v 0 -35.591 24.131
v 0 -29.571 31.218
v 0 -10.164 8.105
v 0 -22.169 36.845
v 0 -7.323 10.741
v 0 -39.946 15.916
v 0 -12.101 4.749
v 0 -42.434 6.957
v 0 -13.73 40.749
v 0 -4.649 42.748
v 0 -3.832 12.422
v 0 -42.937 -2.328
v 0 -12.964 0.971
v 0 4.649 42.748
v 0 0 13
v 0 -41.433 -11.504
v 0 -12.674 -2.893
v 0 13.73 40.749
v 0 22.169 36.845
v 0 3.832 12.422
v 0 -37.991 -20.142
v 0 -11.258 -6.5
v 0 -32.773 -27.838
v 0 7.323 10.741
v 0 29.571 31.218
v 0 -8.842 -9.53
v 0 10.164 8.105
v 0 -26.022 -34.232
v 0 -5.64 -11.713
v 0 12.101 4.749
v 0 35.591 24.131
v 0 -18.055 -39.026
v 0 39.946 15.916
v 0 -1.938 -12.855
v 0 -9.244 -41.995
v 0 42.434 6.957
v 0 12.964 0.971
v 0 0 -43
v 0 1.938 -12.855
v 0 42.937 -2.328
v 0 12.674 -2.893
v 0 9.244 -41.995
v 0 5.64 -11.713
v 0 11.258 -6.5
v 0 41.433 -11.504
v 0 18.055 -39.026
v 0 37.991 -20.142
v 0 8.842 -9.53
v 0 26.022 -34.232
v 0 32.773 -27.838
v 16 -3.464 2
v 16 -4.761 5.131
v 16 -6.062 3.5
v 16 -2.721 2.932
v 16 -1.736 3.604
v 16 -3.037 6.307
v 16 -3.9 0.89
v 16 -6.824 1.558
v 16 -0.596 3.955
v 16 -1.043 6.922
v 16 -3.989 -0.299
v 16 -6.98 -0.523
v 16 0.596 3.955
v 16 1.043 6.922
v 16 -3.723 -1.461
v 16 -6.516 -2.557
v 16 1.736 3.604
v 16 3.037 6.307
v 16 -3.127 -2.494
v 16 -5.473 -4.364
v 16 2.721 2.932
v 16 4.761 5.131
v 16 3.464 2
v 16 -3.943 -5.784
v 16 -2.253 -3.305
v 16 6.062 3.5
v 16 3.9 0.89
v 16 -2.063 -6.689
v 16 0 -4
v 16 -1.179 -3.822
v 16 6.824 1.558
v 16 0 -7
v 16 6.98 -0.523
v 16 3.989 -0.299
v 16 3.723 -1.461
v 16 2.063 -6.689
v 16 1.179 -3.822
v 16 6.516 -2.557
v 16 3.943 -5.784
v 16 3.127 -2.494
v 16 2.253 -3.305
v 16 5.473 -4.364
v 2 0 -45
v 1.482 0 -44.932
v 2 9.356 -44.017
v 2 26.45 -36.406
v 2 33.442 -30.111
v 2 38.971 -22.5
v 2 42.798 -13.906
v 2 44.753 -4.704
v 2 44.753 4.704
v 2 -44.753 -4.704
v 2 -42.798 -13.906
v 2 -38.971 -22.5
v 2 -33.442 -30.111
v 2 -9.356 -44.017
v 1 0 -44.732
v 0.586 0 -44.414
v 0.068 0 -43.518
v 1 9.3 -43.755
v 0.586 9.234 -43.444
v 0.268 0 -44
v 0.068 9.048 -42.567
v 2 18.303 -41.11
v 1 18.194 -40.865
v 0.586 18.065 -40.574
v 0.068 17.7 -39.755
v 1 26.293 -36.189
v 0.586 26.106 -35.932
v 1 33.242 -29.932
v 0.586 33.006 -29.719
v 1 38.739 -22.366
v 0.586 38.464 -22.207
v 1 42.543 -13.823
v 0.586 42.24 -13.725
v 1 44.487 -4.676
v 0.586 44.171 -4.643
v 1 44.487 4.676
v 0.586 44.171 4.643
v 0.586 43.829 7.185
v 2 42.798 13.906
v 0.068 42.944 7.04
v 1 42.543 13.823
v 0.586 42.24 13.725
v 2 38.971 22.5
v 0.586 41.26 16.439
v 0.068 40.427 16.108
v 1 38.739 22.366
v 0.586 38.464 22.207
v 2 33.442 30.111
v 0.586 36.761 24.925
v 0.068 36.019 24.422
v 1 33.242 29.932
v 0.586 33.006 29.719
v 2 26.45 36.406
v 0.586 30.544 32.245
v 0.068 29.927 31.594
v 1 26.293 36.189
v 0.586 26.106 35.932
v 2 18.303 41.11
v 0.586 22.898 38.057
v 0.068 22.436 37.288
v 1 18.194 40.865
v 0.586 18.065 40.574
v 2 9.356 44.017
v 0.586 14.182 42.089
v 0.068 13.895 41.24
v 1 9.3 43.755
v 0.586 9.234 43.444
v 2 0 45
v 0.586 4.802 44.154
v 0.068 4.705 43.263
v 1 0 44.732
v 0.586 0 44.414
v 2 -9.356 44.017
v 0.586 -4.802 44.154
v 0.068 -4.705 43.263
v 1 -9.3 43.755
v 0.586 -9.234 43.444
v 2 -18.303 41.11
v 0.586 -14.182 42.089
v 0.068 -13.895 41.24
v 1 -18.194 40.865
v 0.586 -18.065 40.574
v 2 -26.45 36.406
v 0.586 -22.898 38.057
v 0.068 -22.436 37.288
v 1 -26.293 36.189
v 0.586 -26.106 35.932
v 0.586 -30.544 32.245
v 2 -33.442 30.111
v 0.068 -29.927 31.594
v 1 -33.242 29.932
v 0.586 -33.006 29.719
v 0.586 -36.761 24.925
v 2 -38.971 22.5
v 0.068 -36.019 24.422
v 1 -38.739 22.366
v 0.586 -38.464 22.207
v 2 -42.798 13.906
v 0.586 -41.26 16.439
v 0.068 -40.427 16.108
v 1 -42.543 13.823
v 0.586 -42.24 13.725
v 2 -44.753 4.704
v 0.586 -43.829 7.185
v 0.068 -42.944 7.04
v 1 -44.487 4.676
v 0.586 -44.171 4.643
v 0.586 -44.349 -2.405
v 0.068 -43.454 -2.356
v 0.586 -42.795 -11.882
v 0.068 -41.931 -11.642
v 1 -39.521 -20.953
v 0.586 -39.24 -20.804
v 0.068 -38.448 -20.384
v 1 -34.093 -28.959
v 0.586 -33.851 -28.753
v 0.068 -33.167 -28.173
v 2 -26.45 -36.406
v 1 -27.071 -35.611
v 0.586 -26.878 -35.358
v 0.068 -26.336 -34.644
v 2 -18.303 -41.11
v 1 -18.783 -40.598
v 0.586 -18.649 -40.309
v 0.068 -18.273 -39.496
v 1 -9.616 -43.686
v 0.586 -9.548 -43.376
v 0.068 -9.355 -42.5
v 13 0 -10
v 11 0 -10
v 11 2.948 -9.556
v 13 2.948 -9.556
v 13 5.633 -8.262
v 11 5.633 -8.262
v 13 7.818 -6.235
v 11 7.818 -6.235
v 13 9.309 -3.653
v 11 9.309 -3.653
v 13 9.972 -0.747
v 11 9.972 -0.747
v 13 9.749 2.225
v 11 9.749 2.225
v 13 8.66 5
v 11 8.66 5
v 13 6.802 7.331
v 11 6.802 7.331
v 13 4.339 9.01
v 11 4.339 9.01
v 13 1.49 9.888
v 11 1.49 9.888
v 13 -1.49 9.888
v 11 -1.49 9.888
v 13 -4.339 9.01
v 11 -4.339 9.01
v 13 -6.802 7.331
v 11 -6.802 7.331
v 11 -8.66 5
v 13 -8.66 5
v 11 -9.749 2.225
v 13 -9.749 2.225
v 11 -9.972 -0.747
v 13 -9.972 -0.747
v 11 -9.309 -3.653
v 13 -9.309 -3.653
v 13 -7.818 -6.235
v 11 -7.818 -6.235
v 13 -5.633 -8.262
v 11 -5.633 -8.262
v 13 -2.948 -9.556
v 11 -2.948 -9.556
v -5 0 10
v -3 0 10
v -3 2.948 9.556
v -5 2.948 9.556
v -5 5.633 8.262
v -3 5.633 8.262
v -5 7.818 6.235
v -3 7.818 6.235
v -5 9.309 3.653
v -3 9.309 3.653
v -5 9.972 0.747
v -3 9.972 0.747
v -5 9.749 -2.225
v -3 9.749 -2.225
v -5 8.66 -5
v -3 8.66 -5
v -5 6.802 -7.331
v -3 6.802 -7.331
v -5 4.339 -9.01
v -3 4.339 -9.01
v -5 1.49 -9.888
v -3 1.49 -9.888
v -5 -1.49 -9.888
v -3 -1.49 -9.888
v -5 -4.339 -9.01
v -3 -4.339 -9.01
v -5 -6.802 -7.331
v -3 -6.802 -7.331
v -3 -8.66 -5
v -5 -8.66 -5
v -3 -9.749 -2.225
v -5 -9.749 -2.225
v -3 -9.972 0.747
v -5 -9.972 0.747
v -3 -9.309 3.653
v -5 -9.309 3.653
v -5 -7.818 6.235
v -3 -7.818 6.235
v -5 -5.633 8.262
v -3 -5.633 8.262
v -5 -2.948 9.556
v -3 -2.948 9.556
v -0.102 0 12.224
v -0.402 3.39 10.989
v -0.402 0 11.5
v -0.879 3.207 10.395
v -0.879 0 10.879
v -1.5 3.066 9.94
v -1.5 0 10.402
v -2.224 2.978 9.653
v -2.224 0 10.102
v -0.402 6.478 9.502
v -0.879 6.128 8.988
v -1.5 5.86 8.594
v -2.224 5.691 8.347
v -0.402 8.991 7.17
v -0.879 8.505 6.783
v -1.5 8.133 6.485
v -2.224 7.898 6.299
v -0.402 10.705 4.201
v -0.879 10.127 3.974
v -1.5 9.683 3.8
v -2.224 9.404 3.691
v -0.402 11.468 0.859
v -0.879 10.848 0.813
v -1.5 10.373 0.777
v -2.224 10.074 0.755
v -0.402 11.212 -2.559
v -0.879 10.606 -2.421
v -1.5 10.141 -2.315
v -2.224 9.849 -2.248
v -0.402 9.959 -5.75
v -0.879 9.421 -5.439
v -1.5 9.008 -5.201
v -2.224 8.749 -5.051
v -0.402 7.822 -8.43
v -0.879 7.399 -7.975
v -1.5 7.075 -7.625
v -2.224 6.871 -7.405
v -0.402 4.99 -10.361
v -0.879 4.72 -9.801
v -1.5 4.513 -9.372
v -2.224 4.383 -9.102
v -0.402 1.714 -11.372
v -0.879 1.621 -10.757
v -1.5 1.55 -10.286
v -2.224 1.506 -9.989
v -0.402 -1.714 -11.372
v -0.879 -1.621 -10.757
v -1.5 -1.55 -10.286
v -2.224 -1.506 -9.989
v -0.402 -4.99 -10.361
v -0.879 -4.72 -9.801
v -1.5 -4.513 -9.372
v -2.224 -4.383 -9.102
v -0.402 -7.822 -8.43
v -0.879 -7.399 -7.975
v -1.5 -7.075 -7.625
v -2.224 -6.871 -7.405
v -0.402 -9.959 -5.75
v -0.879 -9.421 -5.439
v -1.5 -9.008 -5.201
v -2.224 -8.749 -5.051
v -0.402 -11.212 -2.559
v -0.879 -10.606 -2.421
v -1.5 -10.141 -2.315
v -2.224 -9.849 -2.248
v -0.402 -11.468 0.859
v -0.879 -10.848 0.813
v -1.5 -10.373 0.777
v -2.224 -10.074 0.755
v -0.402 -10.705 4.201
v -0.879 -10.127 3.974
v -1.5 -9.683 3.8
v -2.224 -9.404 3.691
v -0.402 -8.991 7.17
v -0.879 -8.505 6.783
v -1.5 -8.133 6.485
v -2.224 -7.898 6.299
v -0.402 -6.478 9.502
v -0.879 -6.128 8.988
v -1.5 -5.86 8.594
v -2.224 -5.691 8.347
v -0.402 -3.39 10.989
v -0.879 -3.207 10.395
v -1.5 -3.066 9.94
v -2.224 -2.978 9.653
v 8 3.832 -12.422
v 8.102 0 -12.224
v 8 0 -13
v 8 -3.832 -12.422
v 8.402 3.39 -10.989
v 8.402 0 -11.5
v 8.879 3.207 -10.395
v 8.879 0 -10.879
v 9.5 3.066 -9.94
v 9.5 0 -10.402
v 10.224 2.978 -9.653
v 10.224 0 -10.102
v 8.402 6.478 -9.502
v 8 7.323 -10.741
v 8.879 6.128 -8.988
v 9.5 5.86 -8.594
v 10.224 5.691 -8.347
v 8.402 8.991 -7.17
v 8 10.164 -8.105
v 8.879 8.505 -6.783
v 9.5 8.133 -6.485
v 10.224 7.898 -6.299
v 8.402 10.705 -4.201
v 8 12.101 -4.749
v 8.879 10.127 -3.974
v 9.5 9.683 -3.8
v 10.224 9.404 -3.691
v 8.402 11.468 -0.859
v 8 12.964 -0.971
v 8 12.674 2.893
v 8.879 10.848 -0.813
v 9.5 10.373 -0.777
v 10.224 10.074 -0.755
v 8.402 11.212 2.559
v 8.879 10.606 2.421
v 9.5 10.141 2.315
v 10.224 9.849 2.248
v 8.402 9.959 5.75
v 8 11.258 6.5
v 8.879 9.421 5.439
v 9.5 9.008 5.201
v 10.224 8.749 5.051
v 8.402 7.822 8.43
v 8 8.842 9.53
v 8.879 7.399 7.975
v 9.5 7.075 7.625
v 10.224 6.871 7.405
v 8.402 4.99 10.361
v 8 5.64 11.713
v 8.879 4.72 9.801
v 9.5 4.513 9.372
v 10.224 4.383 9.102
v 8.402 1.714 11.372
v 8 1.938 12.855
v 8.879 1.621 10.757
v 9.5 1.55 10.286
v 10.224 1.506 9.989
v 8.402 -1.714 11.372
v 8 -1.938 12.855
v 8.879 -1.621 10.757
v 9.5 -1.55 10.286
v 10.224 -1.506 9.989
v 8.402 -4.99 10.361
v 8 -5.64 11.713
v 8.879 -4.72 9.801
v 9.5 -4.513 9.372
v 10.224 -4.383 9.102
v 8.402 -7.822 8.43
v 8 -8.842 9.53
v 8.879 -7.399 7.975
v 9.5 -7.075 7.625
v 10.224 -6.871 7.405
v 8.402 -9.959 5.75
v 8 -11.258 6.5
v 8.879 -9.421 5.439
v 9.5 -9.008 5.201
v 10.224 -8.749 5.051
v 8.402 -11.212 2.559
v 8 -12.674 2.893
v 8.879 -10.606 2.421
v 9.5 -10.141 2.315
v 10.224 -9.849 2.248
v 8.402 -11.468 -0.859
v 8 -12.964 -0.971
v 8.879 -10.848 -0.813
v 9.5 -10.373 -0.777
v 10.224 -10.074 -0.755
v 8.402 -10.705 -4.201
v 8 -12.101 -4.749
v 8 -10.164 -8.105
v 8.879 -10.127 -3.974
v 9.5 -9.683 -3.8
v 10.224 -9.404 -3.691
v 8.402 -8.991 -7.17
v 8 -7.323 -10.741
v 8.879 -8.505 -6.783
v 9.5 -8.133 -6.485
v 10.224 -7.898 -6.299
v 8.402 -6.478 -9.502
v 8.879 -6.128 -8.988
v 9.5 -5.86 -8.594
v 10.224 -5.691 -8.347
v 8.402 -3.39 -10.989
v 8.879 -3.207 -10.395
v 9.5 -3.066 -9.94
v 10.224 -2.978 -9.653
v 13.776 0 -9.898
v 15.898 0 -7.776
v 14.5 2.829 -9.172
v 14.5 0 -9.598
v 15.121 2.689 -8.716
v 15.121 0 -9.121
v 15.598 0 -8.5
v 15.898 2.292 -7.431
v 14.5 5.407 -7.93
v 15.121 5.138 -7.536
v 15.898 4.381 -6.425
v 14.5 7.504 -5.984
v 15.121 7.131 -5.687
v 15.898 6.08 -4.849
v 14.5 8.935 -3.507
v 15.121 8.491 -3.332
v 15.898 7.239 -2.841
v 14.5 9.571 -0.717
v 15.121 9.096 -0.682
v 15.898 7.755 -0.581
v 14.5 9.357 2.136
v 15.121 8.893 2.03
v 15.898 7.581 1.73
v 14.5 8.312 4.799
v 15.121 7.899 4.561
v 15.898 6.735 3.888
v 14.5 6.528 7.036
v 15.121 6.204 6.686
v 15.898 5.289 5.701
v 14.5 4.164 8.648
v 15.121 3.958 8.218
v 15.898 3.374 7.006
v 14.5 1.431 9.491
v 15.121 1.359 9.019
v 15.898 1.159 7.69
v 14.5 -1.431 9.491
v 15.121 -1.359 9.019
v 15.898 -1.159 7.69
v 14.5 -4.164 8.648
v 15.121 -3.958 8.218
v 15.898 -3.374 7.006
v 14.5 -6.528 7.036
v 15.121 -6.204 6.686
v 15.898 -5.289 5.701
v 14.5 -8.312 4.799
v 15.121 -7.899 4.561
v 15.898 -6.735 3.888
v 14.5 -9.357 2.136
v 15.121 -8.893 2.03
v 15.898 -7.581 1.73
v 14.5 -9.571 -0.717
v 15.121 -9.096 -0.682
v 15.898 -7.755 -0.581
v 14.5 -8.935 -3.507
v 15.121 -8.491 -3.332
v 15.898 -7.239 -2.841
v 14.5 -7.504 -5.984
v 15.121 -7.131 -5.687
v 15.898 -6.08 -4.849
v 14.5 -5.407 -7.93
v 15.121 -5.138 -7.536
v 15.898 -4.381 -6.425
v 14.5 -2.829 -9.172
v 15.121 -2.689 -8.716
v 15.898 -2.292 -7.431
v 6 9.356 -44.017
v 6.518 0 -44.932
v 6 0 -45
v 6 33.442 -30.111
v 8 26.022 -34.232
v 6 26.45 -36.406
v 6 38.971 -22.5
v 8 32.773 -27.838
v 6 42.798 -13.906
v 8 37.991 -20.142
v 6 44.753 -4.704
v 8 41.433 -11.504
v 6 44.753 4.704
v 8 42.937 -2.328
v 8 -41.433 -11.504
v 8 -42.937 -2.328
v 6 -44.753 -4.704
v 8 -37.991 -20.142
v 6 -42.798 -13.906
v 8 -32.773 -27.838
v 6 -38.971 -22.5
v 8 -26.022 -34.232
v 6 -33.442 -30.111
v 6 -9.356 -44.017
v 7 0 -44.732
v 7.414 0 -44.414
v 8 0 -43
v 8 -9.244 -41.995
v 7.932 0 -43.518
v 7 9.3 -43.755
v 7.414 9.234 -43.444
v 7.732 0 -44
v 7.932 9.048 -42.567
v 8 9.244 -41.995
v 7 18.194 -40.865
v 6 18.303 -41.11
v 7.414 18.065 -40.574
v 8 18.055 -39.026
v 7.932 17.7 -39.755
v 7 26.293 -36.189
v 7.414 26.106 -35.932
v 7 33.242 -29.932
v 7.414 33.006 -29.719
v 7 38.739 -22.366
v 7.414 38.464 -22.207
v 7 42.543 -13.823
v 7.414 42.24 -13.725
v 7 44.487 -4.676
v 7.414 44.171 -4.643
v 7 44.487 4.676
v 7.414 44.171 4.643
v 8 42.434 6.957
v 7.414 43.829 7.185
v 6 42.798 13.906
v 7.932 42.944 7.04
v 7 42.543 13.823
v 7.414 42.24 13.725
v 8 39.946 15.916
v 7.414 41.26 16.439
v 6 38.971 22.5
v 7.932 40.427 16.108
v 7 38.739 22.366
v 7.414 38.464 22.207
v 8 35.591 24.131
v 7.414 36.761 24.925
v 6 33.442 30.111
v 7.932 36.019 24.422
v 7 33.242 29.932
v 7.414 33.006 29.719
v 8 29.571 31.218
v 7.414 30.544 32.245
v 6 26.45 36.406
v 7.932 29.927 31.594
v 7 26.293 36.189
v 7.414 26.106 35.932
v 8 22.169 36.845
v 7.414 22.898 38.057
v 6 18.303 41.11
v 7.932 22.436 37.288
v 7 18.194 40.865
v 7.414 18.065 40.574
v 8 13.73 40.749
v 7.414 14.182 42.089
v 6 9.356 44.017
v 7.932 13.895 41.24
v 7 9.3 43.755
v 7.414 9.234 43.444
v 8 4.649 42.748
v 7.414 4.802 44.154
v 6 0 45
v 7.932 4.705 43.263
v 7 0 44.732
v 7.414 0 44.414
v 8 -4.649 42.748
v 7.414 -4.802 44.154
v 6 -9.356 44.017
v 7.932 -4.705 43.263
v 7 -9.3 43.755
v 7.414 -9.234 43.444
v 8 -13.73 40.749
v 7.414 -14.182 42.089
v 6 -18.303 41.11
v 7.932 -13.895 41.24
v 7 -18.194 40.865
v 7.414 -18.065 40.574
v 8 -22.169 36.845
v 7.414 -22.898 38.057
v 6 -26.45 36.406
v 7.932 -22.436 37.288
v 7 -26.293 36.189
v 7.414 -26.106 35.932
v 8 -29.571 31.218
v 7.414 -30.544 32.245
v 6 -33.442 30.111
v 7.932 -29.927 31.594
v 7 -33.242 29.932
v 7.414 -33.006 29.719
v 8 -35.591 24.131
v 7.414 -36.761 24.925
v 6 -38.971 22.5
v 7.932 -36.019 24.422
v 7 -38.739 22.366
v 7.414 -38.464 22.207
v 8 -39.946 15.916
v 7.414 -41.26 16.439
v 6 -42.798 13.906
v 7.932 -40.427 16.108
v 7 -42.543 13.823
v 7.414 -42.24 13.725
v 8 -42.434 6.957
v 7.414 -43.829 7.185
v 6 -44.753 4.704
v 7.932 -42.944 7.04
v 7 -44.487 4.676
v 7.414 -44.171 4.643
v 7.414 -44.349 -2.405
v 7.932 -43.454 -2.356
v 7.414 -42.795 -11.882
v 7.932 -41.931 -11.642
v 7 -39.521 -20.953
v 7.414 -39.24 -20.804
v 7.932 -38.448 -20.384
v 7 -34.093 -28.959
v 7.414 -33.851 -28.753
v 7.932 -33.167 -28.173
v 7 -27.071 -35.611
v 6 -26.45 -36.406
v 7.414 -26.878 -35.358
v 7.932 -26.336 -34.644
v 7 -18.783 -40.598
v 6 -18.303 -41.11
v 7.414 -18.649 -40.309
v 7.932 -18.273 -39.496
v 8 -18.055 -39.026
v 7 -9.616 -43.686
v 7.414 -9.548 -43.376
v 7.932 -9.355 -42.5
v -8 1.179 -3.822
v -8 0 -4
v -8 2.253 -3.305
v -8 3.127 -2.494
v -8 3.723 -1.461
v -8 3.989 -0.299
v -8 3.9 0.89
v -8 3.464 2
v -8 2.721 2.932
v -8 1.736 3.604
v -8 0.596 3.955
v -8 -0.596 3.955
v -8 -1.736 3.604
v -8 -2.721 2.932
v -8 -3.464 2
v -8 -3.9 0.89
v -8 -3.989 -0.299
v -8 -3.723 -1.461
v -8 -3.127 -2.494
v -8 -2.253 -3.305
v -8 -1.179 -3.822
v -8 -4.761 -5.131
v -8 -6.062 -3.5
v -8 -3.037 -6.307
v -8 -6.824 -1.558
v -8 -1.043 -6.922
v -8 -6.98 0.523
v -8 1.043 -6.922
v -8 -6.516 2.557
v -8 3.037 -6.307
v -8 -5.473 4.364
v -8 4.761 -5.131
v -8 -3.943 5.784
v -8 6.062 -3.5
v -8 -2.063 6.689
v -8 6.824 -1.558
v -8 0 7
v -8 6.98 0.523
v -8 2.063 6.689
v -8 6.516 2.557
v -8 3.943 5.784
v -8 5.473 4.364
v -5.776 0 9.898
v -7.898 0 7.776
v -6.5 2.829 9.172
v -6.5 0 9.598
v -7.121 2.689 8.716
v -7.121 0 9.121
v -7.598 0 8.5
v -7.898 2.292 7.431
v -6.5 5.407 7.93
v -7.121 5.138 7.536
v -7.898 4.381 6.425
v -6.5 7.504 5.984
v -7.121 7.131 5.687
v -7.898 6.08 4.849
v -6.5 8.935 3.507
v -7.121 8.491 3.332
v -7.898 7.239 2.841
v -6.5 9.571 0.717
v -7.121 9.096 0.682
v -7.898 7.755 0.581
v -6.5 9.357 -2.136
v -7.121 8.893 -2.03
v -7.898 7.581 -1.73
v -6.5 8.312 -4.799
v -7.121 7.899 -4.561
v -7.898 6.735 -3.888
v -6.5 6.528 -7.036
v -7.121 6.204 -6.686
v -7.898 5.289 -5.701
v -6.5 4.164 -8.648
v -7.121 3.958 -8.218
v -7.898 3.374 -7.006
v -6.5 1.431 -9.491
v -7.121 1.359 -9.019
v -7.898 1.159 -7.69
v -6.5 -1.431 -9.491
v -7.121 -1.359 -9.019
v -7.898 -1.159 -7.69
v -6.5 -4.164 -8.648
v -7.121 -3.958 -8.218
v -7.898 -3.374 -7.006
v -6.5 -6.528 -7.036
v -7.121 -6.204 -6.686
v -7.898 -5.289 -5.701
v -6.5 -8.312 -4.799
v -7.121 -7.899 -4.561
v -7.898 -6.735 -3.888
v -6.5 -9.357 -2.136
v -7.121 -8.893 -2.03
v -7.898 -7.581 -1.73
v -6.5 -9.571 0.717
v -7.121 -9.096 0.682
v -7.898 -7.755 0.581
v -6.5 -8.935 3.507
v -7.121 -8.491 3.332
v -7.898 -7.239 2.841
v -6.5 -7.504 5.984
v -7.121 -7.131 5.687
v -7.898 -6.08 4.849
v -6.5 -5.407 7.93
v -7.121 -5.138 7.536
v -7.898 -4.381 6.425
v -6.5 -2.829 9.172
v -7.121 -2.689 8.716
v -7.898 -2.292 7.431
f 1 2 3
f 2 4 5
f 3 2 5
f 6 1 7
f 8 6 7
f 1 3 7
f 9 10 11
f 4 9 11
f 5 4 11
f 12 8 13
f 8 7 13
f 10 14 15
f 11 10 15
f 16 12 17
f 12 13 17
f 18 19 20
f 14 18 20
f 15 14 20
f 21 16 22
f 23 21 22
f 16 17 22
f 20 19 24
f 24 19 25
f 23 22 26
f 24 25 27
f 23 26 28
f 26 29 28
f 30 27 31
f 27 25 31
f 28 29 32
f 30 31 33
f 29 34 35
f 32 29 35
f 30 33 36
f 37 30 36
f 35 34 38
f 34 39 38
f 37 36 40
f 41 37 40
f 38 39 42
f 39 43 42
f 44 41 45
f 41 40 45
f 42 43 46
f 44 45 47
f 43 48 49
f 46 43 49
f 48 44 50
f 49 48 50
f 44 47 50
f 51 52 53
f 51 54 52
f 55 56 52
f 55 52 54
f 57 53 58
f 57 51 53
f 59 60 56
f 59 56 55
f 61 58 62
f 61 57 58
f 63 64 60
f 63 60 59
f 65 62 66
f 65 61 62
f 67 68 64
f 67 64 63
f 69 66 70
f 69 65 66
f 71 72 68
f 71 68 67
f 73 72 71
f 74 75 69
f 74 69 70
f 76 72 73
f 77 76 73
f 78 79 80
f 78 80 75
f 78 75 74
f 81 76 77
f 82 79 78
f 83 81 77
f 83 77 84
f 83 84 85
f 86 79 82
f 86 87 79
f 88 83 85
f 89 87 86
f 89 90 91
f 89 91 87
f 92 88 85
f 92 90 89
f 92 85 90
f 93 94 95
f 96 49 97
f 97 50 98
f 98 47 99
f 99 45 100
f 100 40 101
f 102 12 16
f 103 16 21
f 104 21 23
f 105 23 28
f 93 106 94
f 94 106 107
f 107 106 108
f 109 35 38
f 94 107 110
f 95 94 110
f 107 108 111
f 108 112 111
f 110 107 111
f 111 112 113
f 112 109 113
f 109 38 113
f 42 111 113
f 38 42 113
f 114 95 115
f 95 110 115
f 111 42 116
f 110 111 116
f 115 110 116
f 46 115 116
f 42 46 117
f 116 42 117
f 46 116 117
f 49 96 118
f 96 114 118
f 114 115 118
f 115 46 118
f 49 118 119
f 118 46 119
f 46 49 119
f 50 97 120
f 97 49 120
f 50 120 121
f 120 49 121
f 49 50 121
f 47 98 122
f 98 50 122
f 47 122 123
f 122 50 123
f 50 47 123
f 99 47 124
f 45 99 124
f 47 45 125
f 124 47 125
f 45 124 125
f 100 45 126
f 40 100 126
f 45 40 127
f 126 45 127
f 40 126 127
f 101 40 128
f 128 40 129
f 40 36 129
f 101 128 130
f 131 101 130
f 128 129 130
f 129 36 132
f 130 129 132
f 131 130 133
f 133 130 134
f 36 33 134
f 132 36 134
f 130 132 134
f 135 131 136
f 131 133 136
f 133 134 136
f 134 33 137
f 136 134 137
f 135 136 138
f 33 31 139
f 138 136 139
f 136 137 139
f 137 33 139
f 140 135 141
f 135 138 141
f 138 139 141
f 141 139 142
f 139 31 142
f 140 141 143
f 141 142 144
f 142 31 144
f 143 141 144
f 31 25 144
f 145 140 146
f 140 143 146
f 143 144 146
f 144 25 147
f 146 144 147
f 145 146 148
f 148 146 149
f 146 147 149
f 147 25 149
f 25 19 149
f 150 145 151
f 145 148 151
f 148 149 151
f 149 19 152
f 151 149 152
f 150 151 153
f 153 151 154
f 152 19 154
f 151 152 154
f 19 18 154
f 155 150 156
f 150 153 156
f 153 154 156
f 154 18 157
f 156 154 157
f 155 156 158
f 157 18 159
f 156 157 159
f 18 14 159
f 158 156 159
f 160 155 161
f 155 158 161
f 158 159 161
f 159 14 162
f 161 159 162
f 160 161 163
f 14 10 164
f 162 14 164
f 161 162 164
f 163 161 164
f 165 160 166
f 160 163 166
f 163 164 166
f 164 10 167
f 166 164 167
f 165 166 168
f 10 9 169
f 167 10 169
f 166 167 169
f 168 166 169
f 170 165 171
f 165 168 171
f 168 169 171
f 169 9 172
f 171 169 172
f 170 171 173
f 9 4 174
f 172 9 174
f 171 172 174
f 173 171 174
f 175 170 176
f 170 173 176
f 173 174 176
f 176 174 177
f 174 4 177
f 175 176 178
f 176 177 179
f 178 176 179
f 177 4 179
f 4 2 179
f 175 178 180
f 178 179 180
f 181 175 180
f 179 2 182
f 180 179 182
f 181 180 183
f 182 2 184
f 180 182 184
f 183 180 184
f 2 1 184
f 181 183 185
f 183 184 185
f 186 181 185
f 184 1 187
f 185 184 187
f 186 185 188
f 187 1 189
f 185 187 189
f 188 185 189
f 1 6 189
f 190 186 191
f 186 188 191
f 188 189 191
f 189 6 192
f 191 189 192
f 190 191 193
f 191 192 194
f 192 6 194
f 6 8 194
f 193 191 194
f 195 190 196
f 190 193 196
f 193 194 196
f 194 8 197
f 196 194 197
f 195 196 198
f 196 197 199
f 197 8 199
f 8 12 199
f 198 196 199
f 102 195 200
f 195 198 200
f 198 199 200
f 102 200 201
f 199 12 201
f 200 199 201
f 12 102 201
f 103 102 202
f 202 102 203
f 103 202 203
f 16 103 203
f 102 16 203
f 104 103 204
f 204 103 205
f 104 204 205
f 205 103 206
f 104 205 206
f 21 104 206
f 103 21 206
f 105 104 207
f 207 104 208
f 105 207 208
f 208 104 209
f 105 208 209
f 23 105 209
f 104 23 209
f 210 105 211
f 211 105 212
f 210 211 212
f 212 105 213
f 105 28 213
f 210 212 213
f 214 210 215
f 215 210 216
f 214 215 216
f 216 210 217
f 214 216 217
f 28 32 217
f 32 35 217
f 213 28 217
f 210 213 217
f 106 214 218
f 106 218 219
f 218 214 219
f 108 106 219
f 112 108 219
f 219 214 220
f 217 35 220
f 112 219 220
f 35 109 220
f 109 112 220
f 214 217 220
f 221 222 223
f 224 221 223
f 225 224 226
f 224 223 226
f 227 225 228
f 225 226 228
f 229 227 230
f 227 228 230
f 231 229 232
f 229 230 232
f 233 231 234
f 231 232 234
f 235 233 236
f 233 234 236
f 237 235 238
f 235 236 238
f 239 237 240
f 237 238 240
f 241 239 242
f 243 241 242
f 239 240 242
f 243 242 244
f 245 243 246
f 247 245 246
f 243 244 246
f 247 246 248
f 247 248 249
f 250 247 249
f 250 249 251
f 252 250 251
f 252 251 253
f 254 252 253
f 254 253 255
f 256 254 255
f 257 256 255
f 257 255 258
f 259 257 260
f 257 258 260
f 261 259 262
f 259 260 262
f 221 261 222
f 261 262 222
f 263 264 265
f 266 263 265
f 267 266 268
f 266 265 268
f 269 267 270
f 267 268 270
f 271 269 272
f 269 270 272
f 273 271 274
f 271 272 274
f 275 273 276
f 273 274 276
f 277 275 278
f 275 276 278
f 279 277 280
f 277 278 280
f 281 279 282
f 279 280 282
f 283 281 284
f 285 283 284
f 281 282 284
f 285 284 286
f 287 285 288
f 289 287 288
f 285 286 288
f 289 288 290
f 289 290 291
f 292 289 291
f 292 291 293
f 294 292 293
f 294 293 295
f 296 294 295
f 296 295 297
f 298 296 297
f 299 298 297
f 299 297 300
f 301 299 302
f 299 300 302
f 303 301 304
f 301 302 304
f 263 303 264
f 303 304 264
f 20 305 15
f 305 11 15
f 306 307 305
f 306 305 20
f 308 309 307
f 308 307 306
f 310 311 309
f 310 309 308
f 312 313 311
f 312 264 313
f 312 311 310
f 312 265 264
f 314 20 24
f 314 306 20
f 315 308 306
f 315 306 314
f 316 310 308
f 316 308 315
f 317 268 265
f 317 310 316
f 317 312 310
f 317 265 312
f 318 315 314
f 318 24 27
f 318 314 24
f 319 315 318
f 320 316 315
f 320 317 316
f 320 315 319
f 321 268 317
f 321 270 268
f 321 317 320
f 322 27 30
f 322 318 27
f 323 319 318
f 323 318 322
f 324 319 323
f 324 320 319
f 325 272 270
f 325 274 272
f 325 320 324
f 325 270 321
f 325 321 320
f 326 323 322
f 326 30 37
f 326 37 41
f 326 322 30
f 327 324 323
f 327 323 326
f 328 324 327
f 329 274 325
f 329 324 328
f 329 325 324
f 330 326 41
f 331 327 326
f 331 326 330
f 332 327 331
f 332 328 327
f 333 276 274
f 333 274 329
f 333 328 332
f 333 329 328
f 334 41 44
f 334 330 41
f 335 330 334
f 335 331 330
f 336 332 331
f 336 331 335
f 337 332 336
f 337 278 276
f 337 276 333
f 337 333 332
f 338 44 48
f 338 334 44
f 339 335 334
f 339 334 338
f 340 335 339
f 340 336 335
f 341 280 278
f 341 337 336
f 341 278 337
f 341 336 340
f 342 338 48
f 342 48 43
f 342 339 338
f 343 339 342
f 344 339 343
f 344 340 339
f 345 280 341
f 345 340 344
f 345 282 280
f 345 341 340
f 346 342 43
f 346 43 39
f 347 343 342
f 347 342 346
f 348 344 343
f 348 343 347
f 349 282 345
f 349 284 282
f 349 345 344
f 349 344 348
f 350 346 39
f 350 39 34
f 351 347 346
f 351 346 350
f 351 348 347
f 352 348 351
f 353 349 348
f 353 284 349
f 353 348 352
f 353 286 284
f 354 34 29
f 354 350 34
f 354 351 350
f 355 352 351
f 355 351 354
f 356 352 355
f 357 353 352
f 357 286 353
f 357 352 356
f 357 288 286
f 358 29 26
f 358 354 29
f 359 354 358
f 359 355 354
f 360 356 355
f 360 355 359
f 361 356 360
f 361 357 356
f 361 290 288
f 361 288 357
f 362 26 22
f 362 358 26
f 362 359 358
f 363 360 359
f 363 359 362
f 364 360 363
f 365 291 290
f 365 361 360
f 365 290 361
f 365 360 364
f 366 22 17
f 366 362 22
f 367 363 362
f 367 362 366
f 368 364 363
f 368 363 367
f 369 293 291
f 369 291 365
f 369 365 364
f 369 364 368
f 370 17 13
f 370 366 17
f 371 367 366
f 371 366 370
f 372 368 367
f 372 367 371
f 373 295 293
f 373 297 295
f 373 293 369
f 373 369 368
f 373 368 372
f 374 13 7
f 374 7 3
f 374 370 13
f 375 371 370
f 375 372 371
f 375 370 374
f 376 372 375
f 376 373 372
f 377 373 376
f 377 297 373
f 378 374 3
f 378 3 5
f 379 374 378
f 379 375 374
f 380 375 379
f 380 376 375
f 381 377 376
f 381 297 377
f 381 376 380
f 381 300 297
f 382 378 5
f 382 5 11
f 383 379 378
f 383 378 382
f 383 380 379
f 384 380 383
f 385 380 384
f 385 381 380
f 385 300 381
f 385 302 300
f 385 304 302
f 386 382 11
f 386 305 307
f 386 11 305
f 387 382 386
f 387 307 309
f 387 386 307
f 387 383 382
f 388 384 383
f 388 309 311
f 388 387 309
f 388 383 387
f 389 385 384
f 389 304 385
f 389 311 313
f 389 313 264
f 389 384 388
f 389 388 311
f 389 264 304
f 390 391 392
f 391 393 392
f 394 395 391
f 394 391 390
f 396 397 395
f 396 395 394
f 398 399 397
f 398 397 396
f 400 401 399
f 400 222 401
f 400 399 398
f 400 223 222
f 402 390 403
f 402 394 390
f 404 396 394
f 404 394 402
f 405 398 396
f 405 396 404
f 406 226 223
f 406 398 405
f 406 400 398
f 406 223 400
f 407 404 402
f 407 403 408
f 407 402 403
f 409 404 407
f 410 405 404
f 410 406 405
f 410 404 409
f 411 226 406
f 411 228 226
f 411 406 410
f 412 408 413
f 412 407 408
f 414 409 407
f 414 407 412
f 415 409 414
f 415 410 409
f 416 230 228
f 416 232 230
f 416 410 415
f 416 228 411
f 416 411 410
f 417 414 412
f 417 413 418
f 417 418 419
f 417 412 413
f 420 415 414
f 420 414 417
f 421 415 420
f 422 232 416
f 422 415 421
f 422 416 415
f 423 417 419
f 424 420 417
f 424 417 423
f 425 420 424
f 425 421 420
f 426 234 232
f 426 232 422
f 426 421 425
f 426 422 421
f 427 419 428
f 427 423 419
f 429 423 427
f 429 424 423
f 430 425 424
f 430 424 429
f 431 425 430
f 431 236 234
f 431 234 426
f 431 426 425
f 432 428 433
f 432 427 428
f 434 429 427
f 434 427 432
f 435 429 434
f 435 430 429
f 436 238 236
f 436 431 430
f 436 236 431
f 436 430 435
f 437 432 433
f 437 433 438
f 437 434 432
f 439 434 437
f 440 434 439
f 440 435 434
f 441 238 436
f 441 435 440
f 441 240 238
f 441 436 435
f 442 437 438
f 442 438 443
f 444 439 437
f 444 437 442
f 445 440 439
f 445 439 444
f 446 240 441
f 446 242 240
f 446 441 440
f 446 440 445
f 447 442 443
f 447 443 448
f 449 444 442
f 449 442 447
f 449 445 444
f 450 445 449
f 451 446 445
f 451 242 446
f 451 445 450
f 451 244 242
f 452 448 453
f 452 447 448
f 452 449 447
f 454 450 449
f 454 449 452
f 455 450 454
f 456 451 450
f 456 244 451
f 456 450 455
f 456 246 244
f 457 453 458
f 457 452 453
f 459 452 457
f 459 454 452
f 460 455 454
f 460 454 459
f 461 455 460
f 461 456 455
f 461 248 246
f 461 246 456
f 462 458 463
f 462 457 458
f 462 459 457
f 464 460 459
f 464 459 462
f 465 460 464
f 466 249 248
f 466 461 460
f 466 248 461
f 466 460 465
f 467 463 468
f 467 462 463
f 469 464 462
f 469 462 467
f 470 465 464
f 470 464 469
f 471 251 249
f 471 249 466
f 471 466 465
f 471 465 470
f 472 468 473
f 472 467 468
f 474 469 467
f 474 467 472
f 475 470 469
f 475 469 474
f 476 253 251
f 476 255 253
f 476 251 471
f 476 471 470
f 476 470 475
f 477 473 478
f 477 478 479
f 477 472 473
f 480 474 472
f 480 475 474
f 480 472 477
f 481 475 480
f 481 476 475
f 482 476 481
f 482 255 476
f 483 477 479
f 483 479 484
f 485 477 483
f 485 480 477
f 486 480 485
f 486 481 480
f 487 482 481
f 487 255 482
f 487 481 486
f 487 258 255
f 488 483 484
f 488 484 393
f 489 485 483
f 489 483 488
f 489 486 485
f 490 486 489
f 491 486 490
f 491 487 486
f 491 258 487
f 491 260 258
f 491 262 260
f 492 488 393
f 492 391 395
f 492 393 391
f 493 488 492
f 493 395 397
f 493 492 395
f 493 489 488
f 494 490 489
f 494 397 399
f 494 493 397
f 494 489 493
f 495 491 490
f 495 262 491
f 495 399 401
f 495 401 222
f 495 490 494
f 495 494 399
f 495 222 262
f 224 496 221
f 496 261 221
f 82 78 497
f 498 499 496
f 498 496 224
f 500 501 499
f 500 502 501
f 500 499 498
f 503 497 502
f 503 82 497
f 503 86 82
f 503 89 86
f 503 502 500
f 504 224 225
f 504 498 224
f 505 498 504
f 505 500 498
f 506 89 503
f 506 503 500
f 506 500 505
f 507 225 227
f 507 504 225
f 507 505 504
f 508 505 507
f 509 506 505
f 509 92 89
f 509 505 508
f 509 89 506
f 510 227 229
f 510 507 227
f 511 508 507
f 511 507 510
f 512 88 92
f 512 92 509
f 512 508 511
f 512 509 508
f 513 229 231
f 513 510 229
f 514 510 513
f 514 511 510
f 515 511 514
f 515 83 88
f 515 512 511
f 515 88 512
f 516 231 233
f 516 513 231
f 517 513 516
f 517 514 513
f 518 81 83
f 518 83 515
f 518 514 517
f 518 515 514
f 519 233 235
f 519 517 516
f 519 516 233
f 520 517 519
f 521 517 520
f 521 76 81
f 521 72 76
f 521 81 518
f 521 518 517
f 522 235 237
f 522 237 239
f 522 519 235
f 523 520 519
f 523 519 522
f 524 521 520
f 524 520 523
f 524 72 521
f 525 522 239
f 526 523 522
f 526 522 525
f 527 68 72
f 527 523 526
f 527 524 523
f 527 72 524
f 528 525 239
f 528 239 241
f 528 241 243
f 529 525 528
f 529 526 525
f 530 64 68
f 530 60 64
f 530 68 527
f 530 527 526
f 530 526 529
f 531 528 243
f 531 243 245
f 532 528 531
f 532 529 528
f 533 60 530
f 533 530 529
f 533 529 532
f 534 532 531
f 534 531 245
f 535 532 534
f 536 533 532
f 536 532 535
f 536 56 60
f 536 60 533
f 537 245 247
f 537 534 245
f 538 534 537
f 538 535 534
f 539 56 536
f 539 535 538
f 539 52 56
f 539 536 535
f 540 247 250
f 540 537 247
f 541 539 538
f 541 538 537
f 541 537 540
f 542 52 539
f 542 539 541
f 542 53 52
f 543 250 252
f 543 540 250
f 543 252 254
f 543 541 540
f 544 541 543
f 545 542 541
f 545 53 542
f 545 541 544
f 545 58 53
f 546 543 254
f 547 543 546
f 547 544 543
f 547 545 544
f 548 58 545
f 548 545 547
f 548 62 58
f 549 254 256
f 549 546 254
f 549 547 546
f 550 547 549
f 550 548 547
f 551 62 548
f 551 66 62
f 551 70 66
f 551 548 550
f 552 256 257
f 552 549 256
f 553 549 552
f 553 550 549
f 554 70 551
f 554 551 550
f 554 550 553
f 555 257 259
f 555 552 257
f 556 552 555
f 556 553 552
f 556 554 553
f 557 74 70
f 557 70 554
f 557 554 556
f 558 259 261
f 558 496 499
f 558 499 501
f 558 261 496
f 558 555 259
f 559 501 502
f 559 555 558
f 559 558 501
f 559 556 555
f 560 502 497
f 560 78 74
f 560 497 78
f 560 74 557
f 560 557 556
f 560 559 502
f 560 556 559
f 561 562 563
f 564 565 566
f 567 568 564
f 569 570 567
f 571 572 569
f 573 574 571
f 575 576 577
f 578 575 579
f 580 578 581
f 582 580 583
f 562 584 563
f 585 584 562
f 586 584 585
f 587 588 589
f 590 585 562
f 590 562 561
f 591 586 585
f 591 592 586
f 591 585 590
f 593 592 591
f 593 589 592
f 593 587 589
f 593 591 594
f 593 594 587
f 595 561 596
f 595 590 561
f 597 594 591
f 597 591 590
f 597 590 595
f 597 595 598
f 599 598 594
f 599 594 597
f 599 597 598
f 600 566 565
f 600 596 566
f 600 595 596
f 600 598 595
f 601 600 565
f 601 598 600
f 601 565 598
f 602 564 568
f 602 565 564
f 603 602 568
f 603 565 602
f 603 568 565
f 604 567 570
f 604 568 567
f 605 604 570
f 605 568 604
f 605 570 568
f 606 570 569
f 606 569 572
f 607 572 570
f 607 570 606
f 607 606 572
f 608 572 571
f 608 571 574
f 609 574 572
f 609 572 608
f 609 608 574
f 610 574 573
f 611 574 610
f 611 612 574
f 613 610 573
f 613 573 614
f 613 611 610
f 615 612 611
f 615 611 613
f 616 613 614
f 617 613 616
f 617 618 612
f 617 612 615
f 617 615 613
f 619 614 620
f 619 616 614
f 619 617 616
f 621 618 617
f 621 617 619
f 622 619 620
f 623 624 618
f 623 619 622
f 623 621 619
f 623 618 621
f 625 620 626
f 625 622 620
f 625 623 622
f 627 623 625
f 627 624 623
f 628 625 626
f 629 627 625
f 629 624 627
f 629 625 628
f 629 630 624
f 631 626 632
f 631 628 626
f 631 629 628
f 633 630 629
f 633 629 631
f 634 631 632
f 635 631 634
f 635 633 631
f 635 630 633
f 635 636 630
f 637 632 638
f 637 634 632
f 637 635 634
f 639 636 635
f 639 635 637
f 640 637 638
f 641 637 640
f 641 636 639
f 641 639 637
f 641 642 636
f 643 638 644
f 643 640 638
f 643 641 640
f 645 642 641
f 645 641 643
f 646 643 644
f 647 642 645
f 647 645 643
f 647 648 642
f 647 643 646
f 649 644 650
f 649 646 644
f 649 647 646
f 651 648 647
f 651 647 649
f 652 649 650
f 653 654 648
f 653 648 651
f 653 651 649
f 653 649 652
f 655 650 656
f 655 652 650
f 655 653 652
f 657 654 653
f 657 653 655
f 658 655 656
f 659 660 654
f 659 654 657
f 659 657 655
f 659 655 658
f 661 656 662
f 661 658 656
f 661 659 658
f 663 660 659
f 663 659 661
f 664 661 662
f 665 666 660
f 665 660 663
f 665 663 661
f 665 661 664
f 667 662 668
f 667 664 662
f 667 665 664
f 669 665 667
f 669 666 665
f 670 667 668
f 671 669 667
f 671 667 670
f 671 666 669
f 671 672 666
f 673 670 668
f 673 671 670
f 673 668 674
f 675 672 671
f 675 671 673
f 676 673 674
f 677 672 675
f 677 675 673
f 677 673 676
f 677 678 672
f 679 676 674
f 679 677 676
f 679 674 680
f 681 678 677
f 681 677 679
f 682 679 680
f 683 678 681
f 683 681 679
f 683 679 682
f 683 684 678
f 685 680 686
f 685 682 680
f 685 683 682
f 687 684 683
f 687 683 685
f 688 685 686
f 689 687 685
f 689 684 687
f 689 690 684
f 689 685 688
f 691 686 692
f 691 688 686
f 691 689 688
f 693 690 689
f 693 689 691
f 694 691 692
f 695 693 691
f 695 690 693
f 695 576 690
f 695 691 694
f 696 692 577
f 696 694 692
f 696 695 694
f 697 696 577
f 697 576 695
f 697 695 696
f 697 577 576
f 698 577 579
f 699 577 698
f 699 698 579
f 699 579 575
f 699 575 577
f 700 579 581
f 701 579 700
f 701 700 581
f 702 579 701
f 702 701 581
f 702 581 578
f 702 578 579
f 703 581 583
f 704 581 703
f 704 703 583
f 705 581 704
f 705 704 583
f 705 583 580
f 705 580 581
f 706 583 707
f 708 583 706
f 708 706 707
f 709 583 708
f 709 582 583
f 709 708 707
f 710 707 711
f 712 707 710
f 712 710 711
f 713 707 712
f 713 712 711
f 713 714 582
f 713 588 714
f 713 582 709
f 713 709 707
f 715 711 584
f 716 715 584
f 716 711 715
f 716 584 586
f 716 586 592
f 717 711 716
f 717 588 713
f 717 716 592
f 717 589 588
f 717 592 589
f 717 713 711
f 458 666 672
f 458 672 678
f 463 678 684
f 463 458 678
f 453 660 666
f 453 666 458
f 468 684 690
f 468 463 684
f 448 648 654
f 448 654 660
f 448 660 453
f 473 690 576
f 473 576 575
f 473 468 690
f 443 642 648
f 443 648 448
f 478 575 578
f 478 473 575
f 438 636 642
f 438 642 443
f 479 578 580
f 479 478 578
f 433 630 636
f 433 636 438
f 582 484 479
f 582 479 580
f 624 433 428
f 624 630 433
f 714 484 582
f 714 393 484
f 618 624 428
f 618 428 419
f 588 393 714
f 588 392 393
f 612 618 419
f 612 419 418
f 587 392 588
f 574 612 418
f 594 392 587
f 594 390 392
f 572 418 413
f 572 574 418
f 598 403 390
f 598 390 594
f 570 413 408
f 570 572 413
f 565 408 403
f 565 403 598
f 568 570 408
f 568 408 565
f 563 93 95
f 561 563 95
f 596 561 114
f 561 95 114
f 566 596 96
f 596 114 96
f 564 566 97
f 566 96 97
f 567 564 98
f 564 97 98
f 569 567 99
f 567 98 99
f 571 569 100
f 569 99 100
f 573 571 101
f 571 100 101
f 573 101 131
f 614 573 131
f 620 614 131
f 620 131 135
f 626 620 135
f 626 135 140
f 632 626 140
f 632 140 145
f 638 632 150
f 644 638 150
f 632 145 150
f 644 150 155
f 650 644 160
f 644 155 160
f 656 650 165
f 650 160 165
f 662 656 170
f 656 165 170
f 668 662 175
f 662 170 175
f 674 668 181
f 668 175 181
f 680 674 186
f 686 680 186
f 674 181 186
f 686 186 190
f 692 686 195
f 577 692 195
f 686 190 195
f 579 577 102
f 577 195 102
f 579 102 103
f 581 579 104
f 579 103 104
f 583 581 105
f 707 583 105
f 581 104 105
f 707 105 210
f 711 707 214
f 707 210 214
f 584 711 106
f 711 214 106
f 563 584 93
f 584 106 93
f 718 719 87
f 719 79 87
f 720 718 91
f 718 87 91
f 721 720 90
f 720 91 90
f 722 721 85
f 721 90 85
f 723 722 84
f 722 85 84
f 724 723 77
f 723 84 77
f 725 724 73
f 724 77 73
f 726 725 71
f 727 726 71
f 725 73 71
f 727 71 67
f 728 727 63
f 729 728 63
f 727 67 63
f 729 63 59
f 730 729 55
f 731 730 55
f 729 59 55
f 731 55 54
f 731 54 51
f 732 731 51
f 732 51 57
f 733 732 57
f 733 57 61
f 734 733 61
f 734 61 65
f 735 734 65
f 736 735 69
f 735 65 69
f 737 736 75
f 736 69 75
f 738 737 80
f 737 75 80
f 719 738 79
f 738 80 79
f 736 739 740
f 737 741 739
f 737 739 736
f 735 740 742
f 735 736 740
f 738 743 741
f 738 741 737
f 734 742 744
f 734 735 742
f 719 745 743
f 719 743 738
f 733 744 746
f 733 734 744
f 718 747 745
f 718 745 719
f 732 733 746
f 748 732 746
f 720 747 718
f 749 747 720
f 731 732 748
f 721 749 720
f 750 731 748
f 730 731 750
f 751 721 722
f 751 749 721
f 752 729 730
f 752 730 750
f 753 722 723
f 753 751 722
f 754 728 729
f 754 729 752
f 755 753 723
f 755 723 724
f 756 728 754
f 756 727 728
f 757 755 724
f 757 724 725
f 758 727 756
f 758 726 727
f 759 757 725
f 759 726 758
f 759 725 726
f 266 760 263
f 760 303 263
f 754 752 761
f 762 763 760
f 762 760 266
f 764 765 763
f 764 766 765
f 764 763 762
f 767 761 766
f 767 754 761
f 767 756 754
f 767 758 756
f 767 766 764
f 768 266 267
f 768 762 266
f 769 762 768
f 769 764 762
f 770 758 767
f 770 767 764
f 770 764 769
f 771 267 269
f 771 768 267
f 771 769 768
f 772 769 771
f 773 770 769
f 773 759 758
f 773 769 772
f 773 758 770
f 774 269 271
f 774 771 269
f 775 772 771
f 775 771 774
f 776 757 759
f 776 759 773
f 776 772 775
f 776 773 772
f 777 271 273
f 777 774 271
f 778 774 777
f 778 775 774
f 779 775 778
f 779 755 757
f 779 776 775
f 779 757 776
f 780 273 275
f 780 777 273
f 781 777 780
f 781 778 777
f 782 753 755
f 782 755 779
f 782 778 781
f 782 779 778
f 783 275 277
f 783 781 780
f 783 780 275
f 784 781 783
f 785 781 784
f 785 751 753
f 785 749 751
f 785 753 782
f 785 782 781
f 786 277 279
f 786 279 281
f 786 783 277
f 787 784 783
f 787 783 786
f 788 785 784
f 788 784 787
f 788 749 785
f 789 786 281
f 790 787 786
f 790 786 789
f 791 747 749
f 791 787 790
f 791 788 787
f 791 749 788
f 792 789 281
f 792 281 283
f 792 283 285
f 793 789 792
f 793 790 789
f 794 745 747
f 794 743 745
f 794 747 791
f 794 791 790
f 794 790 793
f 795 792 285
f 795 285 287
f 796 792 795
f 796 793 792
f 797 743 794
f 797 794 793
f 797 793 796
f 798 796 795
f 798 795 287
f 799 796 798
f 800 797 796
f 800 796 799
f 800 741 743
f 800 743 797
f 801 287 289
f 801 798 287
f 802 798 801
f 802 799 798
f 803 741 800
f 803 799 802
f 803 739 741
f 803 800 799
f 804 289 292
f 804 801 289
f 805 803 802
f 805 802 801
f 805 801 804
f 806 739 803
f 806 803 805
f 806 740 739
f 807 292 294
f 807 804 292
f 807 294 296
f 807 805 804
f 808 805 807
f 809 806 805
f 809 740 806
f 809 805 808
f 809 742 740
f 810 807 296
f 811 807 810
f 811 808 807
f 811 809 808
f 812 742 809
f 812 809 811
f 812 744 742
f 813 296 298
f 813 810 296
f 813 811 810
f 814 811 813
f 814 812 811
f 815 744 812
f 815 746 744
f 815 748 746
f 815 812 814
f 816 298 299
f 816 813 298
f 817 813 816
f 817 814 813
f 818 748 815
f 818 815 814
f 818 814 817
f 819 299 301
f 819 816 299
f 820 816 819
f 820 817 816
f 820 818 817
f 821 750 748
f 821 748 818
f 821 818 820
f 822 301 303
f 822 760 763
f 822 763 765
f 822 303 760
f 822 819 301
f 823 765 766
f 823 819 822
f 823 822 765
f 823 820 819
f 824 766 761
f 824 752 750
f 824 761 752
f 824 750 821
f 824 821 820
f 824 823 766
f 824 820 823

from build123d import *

# Parameters (mm, degrees)
SPROCKET_R                    = 45
ESTRUSIONE_ESTRUSIONE2_DEPTH  = 8
SCHIZZO4_R                    = 10
ESTRUSIONE_ESTRUSIONE4_DEPTH  = 8
RACCORDO1_R                   = 2
RACCORDO2_R                   = 3
SCHIZZO7_R                    = 10
ESTRUSIONE_ESTRUSIONE5_DEPTH  = 8
RACCORDO3_R                   = 3
SCHIZZO6_R                    = 4
TAGLIO_ESTRUSIONE4_DEPTH      = 17
TAGLIO_ESTRUSIONE4_DEPTH_BACK = 9


with BuildPart() as part:
    # Sprocket → Estrusione-Estrusione2 (new body)
    with BuildSketch(Plane(origin=(0, 0, 0), x_dir=(0, 0, -1), z_dir=(1, 0, 0))):
        Circle(SPROCKET_R)
    extrude(amount=ESTRUSIONE_ESTRUSIONE2_DEPTH)

    # Schizzo4 → Estrusione-Estrusione4 (add)
    with BuildSketch(Plane(origin=(8, 0, 0), x_dir=(0, 0, -1), z_dir=(1, 0, 0))):
        Circle(SCHIZZO4_R)
    extrude(amount=ESTRUSIONE_ESTRUSIONE4_DEPTH)

    # Raccordo1
    raccordo1_edges = [part.edges().sort_by_distance(p)[0] for p in [
        (0, 0, 45),
        (8, 0, 45),
    ]]
    fillet(raccordo1_edges, radius=RACCORDO1_R)

    # Raccordo2
    raccordo2_edges = [part.edges().sort_by_distance(p)[0] for p in [
        (8, 0, 10),
        (16, 0, 10),
    ]]
    fillet(raccordo2_edges, radius=RACCORDO2_R)

    # Schizzo7 → Estrusione-Estrusione5 (add)
    with BuildSketch(Plane.ZY):
        Circle(SCHIZZO7_R)
    extrude(amount=ESTRUSIONE_ESTRUSIONE5_DEPTH)

    # Raccordo3
    raccordo3_edges = [part.edges().sort_by_distance(p)[0] for p in [
        (0, 0, -10),
        (-8, 0, -10),
    ]]
    fillet(raccordo3_edges, radius=RACCORDO3_R)

    # Schizzo6 → Taglio-Estrusione4 (cut, two sides)
    with BuildSketch(Plane(origin=(0, 0, 0), x_dir=(0, 0, -1), z_dir=(1, 0, 0))) as taglio_estrusione4_sk:
        Circle(SCHIZZO6_R)
    extrude(amount=TAGLIO_ESTRUSIONE4_DEPTH, mode=Mode.SUBTRACT)
    extrude(taglio_estrusione4_sk.sketch, amount=-TAGLIO_ESTRUSIONE4_DEPTH_BACK, mode=Mode.SUBTRACT)


solid = part.part
